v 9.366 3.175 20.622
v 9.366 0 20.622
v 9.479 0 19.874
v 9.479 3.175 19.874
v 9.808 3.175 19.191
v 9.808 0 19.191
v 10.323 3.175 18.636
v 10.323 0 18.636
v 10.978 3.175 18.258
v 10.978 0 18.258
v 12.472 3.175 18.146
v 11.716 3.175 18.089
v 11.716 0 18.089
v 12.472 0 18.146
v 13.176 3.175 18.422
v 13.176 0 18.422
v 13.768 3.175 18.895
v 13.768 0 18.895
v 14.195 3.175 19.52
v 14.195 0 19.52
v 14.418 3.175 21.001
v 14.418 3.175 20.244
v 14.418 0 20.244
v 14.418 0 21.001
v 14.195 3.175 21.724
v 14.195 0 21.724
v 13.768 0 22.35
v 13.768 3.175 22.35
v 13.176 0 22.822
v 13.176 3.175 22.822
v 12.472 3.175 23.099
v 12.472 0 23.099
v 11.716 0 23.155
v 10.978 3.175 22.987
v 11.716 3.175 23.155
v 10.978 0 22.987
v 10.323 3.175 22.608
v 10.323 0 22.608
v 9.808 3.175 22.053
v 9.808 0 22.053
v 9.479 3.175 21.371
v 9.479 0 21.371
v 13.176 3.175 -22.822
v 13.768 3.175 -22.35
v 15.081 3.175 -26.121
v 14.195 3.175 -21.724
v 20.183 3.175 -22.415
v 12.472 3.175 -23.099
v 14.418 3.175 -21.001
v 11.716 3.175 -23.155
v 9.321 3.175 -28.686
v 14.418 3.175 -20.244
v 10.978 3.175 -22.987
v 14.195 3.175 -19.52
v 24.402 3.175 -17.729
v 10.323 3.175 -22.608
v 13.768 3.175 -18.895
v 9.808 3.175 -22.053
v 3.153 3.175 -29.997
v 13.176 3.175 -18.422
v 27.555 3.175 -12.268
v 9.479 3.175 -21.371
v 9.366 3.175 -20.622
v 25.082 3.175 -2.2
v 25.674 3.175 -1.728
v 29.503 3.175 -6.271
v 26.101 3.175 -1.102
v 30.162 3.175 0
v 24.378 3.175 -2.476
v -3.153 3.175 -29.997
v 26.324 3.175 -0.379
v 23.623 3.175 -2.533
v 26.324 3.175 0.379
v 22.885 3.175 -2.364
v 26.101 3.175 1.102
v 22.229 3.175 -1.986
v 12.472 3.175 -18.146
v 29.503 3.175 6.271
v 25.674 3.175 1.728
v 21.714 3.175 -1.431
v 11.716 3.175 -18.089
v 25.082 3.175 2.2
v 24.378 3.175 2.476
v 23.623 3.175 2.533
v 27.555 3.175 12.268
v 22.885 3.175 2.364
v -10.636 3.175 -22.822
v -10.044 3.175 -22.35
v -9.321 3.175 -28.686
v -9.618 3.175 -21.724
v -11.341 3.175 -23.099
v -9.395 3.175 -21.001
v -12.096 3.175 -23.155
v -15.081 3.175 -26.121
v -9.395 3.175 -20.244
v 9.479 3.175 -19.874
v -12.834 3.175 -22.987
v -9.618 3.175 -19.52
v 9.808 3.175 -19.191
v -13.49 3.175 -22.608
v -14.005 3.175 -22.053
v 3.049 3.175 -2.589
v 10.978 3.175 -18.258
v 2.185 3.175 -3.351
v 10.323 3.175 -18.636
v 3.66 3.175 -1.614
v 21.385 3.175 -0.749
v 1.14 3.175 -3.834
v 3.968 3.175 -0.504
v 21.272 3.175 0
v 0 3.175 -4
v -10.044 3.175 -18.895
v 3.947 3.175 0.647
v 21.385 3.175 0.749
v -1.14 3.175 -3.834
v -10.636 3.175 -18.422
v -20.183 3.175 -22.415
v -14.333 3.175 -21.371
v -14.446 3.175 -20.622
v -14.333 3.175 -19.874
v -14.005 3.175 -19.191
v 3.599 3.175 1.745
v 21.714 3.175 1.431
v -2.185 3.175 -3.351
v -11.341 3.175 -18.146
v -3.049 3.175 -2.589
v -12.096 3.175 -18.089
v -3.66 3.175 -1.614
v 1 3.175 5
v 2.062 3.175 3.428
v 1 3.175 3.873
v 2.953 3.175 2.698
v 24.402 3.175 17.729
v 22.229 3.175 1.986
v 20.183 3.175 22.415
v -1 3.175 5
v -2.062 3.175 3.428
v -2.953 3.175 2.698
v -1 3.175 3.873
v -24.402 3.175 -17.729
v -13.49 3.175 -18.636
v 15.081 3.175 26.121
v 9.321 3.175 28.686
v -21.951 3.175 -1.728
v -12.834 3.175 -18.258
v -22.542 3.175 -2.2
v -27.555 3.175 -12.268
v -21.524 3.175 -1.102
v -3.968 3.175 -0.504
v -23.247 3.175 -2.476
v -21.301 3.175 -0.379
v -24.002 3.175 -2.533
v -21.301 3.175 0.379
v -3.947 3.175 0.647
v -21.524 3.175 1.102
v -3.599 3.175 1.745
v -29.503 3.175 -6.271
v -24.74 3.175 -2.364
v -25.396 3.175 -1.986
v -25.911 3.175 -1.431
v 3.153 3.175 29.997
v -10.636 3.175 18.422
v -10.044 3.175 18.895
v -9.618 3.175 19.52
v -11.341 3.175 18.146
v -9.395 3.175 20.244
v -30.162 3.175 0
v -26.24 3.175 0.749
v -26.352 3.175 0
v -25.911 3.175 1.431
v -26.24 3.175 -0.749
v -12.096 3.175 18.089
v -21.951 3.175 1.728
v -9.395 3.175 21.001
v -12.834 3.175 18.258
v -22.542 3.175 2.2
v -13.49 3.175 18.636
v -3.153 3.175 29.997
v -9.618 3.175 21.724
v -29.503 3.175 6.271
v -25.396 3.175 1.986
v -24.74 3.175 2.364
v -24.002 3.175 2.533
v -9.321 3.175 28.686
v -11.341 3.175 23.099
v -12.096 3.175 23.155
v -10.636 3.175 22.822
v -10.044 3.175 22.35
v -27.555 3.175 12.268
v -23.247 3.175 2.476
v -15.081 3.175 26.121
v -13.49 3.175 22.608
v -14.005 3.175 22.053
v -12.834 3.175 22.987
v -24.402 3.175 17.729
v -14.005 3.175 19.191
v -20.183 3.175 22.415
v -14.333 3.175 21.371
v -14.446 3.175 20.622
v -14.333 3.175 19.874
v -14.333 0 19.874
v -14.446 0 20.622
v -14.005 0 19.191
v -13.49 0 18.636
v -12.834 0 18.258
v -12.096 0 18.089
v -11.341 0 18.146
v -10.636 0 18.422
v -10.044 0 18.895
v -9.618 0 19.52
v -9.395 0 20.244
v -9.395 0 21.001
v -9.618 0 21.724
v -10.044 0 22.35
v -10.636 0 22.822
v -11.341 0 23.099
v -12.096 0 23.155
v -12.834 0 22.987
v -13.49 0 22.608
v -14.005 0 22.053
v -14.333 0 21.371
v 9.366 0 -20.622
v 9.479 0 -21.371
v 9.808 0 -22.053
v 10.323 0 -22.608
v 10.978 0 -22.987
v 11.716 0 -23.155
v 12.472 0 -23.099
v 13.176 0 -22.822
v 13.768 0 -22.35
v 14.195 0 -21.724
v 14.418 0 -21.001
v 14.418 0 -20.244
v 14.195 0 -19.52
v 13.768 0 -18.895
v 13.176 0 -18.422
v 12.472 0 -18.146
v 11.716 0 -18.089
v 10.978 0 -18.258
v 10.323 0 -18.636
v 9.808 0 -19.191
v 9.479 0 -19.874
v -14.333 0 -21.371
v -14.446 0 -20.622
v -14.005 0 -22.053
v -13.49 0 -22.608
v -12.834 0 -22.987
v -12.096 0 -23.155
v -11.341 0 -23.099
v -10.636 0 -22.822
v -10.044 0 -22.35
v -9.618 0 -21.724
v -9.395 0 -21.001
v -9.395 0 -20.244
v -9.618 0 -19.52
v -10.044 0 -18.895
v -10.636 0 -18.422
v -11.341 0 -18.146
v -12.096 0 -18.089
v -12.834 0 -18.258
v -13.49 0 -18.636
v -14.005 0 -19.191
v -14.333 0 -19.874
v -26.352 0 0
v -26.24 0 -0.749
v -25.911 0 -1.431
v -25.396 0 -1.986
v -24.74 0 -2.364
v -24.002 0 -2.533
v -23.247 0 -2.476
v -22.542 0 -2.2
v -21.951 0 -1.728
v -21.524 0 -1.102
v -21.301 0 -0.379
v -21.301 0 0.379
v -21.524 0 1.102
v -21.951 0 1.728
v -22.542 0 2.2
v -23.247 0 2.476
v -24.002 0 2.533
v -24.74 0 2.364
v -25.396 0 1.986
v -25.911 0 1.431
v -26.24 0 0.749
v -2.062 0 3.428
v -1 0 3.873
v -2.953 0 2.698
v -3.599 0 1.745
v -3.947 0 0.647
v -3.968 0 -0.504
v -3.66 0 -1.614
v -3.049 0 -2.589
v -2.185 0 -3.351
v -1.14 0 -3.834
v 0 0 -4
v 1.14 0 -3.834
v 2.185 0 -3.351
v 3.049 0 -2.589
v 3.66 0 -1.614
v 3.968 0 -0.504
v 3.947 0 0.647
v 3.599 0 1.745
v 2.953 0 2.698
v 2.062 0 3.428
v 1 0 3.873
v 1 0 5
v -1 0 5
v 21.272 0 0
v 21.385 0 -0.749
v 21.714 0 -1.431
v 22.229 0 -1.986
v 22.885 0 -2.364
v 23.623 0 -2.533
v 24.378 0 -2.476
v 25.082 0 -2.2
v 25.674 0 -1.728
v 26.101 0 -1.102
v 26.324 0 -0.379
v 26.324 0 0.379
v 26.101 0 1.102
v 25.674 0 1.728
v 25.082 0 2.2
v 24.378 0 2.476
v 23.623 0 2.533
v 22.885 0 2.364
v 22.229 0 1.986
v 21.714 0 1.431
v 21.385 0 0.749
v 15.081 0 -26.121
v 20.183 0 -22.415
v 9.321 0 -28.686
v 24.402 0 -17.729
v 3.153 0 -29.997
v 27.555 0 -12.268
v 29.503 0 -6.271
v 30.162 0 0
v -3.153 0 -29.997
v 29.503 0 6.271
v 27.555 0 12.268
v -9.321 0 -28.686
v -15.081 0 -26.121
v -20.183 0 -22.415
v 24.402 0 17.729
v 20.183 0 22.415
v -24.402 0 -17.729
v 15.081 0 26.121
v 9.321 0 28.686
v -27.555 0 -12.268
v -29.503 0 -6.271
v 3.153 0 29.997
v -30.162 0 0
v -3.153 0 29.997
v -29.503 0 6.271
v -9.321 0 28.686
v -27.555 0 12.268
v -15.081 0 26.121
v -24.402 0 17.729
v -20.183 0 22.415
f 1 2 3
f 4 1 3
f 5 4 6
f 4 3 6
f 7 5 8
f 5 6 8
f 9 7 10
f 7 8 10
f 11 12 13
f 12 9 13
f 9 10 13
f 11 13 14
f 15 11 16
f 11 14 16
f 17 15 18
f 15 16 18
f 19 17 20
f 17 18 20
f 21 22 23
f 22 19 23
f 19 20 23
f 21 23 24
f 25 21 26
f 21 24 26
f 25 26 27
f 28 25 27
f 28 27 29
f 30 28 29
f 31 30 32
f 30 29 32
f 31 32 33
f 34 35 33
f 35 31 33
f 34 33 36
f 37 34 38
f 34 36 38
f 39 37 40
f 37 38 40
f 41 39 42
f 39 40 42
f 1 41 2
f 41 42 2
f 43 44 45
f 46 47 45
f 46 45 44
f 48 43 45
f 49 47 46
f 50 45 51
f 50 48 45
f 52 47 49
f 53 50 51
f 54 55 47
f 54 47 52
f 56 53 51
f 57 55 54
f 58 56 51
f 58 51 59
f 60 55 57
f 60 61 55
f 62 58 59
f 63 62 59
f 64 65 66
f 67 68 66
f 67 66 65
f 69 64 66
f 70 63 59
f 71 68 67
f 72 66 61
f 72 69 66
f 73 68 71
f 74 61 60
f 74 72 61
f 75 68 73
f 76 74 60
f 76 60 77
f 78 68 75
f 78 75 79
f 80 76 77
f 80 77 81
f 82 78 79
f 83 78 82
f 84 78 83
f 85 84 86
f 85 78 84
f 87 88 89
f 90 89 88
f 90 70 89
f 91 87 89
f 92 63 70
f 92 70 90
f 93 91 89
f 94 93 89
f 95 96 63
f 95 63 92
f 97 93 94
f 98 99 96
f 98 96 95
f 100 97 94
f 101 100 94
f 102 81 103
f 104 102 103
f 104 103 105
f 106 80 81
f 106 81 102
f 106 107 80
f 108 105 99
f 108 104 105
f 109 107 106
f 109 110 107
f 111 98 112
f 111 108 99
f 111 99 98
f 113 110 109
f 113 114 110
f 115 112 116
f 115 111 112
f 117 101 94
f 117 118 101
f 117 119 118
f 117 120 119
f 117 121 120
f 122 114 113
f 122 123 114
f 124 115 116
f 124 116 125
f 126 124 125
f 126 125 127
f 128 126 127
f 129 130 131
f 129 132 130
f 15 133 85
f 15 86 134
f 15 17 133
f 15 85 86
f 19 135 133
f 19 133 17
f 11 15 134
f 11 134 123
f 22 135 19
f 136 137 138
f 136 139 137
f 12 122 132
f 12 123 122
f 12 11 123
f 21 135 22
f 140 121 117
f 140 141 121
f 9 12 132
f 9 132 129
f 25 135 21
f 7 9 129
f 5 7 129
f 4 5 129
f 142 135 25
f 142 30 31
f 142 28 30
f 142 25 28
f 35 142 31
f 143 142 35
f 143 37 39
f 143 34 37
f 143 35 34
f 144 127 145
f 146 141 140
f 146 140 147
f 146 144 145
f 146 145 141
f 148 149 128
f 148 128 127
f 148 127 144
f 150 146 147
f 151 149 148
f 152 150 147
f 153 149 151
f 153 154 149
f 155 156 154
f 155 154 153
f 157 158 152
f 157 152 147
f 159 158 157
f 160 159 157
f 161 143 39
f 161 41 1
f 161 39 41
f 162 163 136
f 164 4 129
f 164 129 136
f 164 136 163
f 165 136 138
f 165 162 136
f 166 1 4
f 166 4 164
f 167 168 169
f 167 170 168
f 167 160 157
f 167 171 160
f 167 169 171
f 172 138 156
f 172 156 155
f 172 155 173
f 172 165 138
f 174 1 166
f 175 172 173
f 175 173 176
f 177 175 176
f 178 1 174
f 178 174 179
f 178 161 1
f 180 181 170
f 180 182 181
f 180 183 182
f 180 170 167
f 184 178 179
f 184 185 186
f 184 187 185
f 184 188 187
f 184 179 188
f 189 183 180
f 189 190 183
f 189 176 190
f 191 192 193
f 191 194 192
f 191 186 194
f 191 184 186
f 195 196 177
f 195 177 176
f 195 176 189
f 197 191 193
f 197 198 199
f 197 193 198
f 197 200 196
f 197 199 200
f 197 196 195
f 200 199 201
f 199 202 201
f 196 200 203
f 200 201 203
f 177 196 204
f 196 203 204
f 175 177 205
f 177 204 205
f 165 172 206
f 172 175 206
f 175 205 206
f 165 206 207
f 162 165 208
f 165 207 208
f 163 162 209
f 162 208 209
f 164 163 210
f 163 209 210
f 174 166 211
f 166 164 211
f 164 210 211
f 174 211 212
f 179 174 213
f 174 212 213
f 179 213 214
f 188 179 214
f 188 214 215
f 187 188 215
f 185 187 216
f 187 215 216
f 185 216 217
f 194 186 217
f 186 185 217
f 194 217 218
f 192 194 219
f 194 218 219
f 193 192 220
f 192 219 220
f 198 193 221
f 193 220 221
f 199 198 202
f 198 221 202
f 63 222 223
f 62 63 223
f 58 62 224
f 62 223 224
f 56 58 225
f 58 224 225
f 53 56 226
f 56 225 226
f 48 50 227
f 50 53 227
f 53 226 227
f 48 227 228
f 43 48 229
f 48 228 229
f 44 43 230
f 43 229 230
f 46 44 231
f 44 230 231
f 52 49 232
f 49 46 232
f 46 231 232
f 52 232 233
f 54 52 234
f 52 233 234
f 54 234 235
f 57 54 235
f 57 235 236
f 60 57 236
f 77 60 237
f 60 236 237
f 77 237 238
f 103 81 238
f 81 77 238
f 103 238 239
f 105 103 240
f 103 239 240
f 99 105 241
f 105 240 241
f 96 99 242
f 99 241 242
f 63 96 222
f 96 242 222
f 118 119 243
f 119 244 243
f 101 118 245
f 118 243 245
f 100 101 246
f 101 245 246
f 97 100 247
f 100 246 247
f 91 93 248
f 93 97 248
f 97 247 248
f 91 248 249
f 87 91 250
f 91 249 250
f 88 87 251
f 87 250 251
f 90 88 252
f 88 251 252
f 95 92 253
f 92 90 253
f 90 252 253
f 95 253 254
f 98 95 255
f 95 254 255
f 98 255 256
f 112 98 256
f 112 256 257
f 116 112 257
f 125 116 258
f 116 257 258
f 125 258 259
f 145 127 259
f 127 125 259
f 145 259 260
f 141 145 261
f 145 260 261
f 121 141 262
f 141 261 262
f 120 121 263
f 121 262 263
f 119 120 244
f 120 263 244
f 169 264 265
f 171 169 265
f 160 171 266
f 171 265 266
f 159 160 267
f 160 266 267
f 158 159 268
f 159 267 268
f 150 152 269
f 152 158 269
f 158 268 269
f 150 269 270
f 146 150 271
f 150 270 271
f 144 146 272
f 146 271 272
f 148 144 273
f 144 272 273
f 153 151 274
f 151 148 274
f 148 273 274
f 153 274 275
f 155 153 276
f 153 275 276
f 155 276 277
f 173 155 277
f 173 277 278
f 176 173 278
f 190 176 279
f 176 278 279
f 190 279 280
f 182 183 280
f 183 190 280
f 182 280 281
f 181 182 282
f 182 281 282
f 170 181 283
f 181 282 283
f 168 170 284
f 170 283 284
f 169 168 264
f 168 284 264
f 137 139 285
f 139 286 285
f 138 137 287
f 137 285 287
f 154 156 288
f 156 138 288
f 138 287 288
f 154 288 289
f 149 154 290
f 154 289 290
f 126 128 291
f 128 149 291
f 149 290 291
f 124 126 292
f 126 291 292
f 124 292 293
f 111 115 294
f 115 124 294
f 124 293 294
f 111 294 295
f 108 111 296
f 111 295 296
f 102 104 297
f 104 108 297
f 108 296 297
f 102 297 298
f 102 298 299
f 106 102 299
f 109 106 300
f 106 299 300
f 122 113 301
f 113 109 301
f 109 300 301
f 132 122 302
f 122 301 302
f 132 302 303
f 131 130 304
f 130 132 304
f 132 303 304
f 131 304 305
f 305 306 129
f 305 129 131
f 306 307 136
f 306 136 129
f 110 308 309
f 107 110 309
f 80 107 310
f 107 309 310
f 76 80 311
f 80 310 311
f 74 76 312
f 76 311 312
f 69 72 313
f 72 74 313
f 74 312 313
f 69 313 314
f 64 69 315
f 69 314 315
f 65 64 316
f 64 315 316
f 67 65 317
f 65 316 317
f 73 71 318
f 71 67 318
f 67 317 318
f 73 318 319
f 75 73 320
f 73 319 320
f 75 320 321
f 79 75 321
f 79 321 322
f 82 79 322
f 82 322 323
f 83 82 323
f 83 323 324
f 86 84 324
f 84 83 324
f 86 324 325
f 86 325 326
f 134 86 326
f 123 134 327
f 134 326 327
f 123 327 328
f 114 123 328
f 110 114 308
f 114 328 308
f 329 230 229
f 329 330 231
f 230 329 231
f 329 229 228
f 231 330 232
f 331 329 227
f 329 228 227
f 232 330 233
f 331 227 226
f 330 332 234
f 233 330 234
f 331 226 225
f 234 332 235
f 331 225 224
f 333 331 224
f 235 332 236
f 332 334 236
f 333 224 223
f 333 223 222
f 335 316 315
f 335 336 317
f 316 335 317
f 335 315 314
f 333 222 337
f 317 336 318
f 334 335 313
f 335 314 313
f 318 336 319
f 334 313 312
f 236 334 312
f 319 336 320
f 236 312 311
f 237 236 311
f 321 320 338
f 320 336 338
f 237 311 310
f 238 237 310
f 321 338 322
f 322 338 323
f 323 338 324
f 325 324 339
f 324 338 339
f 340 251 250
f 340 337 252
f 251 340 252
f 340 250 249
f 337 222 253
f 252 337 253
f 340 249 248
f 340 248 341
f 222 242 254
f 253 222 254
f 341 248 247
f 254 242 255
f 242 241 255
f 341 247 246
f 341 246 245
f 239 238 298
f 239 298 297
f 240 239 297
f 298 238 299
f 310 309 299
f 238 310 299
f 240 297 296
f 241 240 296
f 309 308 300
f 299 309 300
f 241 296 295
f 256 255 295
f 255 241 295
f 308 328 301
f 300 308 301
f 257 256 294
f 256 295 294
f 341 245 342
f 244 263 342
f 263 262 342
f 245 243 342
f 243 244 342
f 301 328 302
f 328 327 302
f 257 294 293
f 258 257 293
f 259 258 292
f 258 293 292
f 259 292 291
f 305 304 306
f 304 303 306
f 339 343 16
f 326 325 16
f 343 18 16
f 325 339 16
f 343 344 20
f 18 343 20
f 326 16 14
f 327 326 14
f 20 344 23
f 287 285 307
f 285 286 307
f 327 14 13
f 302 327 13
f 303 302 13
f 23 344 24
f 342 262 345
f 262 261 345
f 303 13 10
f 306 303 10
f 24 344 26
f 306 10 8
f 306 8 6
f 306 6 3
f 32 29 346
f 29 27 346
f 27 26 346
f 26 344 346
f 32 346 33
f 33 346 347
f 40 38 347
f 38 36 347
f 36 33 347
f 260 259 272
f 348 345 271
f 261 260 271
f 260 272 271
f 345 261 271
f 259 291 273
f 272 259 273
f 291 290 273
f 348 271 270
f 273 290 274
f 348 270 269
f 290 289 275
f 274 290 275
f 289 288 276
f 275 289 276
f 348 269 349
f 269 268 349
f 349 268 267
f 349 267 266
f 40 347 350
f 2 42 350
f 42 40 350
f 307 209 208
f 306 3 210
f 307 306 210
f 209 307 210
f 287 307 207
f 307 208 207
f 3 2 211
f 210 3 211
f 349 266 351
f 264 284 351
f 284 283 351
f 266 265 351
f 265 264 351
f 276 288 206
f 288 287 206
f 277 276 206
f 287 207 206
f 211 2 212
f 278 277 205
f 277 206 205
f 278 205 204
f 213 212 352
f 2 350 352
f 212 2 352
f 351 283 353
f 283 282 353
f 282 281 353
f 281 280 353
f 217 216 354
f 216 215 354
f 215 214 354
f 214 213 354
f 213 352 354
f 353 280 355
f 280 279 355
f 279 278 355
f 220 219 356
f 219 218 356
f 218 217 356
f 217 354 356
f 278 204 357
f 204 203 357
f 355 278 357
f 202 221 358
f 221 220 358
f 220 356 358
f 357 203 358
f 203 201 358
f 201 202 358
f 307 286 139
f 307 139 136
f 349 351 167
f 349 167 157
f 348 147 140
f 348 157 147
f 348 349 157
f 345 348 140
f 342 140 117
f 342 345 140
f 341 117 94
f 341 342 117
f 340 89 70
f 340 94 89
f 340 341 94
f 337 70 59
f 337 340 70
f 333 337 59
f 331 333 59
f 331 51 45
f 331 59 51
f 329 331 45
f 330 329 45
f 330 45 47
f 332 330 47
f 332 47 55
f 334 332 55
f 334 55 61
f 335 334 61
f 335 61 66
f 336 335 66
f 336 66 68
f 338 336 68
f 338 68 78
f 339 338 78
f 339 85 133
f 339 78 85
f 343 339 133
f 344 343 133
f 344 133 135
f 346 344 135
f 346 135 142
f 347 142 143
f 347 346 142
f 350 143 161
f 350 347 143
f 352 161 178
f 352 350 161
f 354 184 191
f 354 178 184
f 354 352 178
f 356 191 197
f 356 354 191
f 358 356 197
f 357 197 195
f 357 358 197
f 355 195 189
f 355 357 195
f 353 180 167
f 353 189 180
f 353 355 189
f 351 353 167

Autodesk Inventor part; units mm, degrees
ref_plane "YZ Plane" through (0, 0, 0) normal (1, 0, 0) x (0, 1, 0)
ref_plane "XZ Plane" through (0, 0, 0) normal (0, 1, 0) x (-1, 0, 0)
ref_plane "XY Plane" through (0, 0, 0) normal (0, 0, 1) x (1, 0, 0)
sketch "Sketch1" plane through (0, 0, 0) normal (0, 1, 0) x (-1, 0, 0)
  circle A0 centre (-23.8125, 0) radius 2.54
  circle A1 centre (-11.9063, 20.6222) radius 2.54
  circle A2 centre (11.9062, 20.6222) radius 2.54
  circle A3 centre (23.8125, 0) radius 2.54
  circle A4 centre (-11.9063, -20.6222) radius 2.54
  circle A5 centre (11.9062, -20.6222) radius 2.54
  circle A6 centre (0, 0) radius 30.1625
  arc A7 (-1, 3.873) -> (1, 3.873) centre (0, 0) ccw
  line L0 (1, 3.873) -> (1, 5)
  line L1 (1, 5) -> (-1, 5)
  line L2 (-1, 5) -> (-1, 3.873)
  dimension "d0" = 5.08
  dimension "d6" = 5.08
  dimension "d8" = 5.08
  dimension "d10" = 5.08
  dimension "d11" = 60.325
  dimension "d15" = 8
  dimension "d19" = 1
  dimension "d20" = 1
  dimension "d22" = 0
  dimension "d23" = 1
extrude "Extrusion2" add sketch "Sketch1" along normal blind 3.175
properties part number "Pneumatic Hub" material "Aluminum 6061"
